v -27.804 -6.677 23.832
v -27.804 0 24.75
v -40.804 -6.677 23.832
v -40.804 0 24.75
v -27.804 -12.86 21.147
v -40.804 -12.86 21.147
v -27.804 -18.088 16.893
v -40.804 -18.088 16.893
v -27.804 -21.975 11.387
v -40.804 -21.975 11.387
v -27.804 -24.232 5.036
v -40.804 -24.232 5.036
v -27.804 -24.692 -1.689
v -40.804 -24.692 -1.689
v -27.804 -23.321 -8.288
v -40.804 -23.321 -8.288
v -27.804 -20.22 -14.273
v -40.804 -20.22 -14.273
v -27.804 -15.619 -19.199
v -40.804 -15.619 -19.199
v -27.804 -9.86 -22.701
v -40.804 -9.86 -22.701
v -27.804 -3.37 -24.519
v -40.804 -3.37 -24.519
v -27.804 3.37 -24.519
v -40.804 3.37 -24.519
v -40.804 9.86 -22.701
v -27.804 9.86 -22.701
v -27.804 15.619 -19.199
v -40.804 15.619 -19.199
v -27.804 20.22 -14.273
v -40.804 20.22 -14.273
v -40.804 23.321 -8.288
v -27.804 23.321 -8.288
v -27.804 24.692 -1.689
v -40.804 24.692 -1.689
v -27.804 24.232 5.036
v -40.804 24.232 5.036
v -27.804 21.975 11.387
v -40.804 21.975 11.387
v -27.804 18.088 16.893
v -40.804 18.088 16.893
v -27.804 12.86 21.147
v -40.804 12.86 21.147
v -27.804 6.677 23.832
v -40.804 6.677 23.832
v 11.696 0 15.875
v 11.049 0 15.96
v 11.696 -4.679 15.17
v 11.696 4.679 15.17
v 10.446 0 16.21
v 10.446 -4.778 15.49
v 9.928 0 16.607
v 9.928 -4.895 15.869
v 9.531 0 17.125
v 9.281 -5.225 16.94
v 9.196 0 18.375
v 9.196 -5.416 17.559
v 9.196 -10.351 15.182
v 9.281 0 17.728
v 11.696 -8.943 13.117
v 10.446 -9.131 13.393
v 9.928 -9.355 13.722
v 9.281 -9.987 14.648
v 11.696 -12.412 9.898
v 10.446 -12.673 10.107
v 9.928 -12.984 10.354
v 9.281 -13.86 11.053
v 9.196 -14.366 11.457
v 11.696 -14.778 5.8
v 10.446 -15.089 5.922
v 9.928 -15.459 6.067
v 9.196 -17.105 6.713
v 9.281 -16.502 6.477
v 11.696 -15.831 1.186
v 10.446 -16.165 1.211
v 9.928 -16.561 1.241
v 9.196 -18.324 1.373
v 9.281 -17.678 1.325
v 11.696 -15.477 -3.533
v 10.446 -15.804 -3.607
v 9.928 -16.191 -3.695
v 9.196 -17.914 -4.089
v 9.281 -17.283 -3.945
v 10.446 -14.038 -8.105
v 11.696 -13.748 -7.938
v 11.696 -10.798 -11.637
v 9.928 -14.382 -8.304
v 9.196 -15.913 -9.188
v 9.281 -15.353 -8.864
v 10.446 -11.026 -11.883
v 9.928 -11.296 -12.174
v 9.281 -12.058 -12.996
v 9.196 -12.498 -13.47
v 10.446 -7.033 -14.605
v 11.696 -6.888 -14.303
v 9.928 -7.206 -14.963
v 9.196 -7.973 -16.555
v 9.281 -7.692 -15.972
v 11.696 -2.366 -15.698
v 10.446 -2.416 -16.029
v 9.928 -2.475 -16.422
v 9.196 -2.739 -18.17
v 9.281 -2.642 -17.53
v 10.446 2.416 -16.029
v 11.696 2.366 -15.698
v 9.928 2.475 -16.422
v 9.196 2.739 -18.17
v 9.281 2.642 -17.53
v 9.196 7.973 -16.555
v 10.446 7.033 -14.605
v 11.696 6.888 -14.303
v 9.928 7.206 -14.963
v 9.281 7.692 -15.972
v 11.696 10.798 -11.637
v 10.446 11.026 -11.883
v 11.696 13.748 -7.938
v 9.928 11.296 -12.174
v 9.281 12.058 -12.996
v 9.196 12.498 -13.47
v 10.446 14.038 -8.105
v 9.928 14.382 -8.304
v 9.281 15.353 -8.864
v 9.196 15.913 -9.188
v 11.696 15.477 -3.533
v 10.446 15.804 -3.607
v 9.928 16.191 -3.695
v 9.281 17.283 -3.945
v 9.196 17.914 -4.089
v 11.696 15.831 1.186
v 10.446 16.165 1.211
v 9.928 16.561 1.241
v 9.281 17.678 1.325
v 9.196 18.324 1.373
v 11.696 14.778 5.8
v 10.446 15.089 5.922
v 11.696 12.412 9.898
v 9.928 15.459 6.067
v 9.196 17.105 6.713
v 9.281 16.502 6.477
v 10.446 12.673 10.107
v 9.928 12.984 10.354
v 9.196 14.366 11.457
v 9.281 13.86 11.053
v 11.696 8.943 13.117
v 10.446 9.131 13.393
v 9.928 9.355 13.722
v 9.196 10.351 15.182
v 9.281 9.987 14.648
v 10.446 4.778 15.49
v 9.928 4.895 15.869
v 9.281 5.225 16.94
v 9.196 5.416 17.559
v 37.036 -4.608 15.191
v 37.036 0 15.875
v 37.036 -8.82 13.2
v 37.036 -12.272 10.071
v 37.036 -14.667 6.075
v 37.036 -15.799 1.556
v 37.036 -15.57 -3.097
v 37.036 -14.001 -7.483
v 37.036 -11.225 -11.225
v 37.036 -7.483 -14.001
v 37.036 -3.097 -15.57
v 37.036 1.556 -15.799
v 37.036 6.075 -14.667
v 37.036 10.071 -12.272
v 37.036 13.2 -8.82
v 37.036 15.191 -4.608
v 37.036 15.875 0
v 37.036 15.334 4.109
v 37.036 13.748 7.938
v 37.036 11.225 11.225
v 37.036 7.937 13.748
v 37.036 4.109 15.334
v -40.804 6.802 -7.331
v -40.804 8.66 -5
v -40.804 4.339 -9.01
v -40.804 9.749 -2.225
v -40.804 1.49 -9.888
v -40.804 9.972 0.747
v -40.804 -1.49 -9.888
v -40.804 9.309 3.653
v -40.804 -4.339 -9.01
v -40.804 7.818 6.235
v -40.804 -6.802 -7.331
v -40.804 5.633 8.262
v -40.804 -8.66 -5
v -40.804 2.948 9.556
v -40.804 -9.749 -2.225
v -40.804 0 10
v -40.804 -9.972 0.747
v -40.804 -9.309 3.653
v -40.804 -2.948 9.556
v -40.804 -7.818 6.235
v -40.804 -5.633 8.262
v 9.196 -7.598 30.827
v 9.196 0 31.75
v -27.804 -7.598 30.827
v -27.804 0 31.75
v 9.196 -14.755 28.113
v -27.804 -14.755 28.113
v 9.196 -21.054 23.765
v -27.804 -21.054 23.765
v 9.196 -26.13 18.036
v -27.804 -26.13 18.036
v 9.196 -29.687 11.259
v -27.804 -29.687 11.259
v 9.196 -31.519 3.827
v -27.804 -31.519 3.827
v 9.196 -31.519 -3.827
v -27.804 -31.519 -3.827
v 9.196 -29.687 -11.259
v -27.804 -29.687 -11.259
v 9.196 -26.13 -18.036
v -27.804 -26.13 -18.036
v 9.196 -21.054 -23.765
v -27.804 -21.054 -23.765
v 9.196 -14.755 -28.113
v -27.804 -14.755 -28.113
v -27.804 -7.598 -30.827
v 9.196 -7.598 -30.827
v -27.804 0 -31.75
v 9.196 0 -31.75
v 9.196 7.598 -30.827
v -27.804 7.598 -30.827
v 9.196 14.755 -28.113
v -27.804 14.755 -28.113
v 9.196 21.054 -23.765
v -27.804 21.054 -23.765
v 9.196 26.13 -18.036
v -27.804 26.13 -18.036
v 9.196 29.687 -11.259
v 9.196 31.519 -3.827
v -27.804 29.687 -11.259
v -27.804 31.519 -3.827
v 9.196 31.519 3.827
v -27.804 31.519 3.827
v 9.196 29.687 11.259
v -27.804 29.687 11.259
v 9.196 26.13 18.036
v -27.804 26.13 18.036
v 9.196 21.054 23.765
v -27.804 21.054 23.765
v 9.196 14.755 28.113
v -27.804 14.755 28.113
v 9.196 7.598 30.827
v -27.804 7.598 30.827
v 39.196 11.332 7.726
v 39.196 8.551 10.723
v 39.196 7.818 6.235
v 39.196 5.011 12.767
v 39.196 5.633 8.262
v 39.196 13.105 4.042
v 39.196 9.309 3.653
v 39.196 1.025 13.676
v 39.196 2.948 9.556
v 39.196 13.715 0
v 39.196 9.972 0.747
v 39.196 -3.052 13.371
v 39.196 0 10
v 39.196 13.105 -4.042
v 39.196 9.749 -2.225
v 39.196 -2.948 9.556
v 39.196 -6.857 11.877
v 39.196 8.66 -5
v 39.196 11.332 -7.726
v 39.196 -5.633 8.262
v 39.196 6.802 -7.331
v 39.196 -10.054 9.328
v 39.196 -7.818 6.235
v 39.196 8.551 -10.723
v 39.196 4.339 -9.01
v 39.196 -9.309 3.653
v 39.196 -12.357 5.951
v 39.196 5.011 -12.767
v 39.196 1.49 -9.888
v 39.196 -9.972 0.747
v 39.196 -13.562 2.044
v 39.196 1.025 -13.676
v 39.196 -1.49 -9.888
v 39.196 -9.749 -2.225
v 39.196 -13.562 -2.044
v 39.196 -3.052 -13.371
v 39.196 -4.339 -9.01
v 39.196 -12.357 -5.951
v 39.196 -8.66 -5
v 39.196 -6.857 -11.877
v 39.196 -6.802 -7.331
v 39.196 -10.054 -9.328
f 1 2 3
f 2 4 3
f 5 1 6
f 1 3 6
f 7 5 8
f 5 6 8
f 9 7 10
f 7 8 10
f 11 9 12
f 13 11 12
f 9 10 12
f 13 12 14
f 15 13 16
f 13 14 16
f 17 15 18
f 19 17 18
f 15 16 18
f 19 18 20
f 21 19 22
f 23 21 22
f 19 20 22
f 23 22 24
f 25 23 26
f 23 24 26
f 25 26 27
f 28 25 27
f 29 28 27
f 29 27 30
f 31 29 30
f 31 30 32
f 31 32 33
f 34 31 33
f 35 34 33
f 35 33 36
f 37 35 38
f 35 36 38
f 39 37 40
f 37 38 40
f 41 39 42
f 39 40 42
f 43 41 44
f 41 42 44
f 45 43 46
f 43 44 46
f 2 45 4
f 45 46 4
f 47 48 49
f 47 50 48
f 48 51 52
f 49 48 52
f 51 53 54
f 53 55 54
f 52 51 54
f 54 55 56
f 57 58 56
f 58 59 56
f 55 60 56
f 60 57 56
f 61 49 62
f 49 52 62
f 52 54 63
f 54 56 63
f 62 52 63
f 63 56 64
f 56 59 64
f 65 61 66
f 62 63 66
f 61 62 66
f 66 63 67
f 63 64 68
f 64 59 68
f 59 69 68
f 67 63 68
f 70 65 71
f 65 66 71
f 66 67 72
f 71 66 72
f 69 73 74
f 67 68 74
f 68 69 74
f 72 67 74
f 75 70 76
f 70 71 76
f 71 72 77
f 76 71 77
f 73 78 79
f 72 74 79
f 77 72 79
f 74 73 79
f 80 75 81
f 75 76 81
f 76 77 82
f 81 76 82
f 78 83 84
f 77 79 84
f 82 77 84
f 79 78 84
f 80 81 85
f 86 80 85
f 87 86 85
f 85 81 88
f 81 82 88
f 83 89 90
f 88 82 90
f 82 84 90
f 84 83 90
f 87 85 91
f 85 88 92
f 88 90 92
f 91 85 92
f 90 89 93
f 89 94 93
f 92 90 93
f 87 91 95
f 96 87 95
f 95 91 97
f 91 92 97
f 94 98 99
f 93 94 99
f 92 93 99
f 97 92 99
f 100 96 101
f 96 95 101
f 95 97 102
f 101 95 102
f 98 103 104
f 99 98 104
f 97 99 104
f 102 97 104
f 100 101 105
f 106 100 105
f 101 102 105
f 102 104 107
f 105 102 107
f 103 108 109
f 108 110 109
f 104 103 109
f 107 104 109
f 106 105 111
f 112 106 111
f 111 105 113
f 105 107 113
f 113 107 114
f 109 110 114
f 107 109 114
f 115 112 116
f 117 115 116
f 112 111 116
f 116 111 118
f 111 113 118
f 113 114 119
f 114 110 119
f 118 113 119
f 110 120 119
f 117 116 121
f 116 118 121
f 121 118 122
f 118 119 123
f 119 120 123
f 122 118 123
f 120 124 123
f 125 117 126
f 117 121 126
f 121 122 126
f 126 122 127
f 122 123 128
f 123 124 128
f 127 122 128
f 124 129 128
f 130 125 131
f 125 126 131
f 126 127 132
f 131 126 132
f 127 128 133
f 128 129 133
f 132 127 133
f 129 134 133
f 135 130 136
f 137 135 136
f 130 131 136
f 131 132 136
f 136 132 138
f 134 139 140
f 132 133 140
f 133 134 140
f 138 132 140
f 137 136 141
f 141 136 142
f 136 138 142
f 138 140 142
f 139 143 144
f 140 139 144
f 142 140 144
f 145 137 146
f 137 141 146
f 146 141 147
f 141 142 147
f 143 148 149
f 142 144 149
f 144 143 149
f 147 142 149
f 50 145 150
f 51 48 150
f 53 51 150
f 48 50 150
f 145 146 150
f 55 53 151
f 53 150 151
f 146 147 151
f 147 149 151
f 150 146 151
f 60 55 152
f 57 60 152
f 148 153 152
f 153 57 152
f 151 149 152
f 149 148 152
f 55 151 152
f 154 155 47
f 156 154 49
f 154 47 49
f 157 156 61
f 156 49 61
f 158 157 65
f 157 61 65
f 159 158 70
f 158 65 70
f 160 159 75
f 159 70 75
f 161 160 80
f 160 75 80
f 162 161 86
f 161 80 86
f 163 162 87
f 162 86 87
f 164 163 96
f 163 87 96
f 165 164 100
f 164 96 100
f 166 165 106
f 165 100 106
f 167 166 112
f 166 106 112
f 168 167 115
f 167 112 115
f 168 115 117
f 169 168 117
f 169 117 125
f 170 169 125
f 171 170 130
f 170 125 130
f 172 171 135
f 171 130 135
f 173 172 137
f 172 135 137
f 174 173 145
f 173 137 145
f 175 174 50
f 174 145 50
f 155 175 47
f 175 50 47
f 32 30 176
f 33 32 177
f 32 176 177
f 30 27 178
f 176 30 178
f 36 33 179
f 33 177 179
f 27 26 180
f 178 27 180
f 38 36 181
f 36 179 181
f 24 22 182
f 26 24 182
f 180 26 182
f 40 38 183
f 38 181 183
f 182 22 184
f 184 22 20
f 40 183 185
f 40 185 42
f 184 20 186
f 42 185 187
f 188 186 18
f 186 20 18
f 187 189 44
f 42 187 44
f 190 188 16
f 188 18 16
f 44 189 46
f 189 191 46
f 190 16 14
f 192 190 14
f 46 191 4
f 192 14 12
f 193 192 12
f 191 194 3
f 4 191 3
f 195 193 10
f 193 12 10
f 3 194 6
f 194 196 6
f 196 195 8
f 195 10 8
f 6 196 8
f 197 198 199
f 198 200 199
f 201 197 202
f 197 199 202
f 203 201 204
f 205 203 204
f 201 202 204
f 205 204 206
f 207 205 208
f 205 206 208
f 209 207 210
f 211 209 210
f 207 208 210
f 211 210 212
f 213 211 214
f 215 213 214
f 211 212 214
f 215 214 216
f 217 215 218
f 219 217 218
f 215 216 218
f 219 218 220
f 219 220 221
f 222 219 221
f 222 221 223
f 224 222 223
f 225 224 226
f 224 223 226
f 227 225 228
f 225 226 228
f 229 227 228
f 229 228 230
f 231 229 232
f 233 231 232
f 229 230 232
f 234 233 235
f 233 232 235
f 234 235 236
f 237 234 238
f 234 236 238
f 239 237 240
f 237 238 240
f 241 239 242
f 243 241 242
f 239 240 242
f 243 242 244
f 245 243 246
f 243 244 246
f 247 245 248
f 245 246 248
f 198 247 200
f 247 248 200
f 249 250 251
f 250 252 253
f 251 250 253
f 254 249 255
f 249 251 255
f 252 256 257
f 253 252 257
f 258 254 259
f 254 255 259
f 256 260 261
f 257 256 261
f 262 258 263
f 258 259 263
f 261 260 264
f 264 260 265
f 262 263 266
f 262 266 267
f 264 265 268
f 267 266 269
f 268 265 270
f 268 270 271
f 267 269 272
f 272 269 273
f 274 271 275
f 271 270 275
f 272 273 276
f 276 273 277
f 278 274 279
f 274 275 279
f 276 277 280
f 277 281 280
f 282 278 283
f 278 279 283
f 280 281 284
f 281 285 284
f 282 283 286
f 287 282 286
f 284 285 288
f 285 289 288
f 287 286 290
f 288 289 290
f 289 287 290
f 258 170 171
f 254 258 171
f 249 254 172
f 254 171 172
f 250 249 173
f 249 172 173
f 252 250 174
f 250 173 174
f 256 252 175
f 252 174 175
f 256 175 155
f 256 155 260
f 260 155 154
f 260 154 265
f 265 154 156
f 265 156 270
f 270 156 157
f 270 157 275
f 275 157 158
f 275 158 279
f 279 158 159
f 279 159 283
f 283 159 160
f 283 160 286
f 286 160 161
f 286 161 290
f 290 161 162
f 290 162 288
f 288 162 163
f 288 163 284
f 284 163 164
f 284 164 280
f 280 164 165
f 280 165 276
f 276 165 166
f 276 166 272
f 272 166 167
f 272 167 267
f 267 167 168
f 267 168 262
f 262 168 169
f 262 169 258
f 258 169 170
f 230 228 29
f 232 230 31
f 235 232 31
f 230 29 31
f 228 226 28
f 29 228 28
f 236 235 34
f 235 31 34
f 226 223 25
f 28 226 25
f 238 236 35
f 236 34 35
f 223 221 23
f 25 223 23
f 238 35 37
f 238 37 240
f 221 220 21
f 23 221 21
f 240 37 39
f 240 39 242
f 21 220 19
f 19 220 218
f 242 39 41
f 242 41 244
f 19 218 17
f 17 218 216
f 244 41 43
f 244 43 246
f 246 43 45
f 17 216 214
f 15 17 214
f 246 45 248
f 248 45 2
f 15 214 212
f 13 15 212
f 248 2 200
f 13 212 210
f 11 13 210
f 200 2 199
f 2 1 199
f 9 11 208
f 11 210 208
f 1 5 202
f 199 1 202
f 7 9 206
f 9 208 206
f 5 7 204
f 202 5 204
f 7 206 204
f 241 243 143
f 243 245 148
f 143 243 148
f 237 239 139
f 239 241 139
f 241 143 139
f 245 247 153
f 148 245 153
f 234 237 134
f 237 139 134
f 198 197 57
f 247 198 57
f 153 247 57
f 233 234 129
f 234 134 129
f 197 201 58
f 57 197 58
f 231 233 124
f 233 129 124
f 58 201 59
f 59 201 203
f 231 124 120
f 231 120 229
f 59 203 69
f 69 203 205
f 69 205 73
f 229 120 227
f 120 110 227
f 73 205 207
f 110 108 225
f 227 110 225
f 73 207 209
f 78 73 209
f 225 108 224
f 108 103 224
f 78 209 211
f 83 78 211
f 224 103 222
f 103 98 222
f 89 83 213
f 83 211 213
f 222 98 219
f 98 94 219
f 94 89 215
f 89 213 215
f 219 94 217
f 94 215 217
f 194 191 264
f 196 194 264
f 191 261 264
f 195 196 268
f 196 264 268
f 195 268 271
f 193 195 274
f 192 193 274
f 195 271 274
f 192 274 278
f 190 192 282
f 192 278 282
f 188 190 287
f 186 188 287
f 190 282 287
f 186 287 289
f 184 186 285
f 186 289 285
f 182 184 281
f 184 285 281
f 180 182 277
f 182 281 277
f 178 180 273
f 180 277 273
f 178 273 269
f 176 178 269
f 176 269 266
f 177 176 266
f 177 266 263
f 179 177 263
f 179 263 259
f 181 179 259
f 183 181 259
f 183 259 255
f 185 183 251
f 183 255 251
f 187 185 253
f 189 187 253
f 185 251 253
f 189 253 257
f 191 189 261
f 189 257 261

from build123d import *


# Read off the part's stored shape, not the designer's step: 1-1/4-7 Machine Threads Stud1
with BuildPart() as part:
    # Sketch1 → Revolve1 (revolve)
    with BuildSketch(Plane.XY, mode=Mode.PRIVATE) as revolve1_sk:
        with BuildLine():
            Line((-40.804054054, 10), (-27.804054054, 10))
            Line((-27.804054054, 10), (9.195945946, 10))
            Line((9.195945946, 10), (39.195945946, 10))
            Line((39.195945946, 10), (39.195945946, 15.875))
            Line((39.195945946, 15.875), (11.695945946, 15.875))
            ThreePointArc((11.695945946, 15.875), (9.928178993, 16.607233047), (9.195945946, 18.375))
            Line((9.195945946, 18.375), (9.195945946, 31.75))
            Line((9.195945946, 31.75), (-27.804054054, 31.75))
            Line((-27.804054054, 31.75), (-27.804054054, 24.75))
            Line((-27.804054054, 24.75), (-40.804054054, 24.75))
            Line((-40.804054054, 24.75), (-40.804054054, 10))
        make_face()
    revolve(revolve1_sk.sketch.rotate(Axis((-48.587837838, 0, 0), (1, 0, 0)), 90), axis=Axis((-48.587837838, 0, 0), (1, 0, 0)))

    # 1-1/4-7 Machine Threads Stud1 outline → 1-1/4-7 Machine Threads Stud1 (revolve, cut)
    with BuildSketch(Plane.YX):
        Polygon((15.875, 39.195945946), (13.71473, 39.195945946), (15.875, 37.035675946), align=None)
    revolve(axis=Axis((0, 0, 0), (1, 0, 0)), mode=Mode.SUBTRACT)


solid = part.part
